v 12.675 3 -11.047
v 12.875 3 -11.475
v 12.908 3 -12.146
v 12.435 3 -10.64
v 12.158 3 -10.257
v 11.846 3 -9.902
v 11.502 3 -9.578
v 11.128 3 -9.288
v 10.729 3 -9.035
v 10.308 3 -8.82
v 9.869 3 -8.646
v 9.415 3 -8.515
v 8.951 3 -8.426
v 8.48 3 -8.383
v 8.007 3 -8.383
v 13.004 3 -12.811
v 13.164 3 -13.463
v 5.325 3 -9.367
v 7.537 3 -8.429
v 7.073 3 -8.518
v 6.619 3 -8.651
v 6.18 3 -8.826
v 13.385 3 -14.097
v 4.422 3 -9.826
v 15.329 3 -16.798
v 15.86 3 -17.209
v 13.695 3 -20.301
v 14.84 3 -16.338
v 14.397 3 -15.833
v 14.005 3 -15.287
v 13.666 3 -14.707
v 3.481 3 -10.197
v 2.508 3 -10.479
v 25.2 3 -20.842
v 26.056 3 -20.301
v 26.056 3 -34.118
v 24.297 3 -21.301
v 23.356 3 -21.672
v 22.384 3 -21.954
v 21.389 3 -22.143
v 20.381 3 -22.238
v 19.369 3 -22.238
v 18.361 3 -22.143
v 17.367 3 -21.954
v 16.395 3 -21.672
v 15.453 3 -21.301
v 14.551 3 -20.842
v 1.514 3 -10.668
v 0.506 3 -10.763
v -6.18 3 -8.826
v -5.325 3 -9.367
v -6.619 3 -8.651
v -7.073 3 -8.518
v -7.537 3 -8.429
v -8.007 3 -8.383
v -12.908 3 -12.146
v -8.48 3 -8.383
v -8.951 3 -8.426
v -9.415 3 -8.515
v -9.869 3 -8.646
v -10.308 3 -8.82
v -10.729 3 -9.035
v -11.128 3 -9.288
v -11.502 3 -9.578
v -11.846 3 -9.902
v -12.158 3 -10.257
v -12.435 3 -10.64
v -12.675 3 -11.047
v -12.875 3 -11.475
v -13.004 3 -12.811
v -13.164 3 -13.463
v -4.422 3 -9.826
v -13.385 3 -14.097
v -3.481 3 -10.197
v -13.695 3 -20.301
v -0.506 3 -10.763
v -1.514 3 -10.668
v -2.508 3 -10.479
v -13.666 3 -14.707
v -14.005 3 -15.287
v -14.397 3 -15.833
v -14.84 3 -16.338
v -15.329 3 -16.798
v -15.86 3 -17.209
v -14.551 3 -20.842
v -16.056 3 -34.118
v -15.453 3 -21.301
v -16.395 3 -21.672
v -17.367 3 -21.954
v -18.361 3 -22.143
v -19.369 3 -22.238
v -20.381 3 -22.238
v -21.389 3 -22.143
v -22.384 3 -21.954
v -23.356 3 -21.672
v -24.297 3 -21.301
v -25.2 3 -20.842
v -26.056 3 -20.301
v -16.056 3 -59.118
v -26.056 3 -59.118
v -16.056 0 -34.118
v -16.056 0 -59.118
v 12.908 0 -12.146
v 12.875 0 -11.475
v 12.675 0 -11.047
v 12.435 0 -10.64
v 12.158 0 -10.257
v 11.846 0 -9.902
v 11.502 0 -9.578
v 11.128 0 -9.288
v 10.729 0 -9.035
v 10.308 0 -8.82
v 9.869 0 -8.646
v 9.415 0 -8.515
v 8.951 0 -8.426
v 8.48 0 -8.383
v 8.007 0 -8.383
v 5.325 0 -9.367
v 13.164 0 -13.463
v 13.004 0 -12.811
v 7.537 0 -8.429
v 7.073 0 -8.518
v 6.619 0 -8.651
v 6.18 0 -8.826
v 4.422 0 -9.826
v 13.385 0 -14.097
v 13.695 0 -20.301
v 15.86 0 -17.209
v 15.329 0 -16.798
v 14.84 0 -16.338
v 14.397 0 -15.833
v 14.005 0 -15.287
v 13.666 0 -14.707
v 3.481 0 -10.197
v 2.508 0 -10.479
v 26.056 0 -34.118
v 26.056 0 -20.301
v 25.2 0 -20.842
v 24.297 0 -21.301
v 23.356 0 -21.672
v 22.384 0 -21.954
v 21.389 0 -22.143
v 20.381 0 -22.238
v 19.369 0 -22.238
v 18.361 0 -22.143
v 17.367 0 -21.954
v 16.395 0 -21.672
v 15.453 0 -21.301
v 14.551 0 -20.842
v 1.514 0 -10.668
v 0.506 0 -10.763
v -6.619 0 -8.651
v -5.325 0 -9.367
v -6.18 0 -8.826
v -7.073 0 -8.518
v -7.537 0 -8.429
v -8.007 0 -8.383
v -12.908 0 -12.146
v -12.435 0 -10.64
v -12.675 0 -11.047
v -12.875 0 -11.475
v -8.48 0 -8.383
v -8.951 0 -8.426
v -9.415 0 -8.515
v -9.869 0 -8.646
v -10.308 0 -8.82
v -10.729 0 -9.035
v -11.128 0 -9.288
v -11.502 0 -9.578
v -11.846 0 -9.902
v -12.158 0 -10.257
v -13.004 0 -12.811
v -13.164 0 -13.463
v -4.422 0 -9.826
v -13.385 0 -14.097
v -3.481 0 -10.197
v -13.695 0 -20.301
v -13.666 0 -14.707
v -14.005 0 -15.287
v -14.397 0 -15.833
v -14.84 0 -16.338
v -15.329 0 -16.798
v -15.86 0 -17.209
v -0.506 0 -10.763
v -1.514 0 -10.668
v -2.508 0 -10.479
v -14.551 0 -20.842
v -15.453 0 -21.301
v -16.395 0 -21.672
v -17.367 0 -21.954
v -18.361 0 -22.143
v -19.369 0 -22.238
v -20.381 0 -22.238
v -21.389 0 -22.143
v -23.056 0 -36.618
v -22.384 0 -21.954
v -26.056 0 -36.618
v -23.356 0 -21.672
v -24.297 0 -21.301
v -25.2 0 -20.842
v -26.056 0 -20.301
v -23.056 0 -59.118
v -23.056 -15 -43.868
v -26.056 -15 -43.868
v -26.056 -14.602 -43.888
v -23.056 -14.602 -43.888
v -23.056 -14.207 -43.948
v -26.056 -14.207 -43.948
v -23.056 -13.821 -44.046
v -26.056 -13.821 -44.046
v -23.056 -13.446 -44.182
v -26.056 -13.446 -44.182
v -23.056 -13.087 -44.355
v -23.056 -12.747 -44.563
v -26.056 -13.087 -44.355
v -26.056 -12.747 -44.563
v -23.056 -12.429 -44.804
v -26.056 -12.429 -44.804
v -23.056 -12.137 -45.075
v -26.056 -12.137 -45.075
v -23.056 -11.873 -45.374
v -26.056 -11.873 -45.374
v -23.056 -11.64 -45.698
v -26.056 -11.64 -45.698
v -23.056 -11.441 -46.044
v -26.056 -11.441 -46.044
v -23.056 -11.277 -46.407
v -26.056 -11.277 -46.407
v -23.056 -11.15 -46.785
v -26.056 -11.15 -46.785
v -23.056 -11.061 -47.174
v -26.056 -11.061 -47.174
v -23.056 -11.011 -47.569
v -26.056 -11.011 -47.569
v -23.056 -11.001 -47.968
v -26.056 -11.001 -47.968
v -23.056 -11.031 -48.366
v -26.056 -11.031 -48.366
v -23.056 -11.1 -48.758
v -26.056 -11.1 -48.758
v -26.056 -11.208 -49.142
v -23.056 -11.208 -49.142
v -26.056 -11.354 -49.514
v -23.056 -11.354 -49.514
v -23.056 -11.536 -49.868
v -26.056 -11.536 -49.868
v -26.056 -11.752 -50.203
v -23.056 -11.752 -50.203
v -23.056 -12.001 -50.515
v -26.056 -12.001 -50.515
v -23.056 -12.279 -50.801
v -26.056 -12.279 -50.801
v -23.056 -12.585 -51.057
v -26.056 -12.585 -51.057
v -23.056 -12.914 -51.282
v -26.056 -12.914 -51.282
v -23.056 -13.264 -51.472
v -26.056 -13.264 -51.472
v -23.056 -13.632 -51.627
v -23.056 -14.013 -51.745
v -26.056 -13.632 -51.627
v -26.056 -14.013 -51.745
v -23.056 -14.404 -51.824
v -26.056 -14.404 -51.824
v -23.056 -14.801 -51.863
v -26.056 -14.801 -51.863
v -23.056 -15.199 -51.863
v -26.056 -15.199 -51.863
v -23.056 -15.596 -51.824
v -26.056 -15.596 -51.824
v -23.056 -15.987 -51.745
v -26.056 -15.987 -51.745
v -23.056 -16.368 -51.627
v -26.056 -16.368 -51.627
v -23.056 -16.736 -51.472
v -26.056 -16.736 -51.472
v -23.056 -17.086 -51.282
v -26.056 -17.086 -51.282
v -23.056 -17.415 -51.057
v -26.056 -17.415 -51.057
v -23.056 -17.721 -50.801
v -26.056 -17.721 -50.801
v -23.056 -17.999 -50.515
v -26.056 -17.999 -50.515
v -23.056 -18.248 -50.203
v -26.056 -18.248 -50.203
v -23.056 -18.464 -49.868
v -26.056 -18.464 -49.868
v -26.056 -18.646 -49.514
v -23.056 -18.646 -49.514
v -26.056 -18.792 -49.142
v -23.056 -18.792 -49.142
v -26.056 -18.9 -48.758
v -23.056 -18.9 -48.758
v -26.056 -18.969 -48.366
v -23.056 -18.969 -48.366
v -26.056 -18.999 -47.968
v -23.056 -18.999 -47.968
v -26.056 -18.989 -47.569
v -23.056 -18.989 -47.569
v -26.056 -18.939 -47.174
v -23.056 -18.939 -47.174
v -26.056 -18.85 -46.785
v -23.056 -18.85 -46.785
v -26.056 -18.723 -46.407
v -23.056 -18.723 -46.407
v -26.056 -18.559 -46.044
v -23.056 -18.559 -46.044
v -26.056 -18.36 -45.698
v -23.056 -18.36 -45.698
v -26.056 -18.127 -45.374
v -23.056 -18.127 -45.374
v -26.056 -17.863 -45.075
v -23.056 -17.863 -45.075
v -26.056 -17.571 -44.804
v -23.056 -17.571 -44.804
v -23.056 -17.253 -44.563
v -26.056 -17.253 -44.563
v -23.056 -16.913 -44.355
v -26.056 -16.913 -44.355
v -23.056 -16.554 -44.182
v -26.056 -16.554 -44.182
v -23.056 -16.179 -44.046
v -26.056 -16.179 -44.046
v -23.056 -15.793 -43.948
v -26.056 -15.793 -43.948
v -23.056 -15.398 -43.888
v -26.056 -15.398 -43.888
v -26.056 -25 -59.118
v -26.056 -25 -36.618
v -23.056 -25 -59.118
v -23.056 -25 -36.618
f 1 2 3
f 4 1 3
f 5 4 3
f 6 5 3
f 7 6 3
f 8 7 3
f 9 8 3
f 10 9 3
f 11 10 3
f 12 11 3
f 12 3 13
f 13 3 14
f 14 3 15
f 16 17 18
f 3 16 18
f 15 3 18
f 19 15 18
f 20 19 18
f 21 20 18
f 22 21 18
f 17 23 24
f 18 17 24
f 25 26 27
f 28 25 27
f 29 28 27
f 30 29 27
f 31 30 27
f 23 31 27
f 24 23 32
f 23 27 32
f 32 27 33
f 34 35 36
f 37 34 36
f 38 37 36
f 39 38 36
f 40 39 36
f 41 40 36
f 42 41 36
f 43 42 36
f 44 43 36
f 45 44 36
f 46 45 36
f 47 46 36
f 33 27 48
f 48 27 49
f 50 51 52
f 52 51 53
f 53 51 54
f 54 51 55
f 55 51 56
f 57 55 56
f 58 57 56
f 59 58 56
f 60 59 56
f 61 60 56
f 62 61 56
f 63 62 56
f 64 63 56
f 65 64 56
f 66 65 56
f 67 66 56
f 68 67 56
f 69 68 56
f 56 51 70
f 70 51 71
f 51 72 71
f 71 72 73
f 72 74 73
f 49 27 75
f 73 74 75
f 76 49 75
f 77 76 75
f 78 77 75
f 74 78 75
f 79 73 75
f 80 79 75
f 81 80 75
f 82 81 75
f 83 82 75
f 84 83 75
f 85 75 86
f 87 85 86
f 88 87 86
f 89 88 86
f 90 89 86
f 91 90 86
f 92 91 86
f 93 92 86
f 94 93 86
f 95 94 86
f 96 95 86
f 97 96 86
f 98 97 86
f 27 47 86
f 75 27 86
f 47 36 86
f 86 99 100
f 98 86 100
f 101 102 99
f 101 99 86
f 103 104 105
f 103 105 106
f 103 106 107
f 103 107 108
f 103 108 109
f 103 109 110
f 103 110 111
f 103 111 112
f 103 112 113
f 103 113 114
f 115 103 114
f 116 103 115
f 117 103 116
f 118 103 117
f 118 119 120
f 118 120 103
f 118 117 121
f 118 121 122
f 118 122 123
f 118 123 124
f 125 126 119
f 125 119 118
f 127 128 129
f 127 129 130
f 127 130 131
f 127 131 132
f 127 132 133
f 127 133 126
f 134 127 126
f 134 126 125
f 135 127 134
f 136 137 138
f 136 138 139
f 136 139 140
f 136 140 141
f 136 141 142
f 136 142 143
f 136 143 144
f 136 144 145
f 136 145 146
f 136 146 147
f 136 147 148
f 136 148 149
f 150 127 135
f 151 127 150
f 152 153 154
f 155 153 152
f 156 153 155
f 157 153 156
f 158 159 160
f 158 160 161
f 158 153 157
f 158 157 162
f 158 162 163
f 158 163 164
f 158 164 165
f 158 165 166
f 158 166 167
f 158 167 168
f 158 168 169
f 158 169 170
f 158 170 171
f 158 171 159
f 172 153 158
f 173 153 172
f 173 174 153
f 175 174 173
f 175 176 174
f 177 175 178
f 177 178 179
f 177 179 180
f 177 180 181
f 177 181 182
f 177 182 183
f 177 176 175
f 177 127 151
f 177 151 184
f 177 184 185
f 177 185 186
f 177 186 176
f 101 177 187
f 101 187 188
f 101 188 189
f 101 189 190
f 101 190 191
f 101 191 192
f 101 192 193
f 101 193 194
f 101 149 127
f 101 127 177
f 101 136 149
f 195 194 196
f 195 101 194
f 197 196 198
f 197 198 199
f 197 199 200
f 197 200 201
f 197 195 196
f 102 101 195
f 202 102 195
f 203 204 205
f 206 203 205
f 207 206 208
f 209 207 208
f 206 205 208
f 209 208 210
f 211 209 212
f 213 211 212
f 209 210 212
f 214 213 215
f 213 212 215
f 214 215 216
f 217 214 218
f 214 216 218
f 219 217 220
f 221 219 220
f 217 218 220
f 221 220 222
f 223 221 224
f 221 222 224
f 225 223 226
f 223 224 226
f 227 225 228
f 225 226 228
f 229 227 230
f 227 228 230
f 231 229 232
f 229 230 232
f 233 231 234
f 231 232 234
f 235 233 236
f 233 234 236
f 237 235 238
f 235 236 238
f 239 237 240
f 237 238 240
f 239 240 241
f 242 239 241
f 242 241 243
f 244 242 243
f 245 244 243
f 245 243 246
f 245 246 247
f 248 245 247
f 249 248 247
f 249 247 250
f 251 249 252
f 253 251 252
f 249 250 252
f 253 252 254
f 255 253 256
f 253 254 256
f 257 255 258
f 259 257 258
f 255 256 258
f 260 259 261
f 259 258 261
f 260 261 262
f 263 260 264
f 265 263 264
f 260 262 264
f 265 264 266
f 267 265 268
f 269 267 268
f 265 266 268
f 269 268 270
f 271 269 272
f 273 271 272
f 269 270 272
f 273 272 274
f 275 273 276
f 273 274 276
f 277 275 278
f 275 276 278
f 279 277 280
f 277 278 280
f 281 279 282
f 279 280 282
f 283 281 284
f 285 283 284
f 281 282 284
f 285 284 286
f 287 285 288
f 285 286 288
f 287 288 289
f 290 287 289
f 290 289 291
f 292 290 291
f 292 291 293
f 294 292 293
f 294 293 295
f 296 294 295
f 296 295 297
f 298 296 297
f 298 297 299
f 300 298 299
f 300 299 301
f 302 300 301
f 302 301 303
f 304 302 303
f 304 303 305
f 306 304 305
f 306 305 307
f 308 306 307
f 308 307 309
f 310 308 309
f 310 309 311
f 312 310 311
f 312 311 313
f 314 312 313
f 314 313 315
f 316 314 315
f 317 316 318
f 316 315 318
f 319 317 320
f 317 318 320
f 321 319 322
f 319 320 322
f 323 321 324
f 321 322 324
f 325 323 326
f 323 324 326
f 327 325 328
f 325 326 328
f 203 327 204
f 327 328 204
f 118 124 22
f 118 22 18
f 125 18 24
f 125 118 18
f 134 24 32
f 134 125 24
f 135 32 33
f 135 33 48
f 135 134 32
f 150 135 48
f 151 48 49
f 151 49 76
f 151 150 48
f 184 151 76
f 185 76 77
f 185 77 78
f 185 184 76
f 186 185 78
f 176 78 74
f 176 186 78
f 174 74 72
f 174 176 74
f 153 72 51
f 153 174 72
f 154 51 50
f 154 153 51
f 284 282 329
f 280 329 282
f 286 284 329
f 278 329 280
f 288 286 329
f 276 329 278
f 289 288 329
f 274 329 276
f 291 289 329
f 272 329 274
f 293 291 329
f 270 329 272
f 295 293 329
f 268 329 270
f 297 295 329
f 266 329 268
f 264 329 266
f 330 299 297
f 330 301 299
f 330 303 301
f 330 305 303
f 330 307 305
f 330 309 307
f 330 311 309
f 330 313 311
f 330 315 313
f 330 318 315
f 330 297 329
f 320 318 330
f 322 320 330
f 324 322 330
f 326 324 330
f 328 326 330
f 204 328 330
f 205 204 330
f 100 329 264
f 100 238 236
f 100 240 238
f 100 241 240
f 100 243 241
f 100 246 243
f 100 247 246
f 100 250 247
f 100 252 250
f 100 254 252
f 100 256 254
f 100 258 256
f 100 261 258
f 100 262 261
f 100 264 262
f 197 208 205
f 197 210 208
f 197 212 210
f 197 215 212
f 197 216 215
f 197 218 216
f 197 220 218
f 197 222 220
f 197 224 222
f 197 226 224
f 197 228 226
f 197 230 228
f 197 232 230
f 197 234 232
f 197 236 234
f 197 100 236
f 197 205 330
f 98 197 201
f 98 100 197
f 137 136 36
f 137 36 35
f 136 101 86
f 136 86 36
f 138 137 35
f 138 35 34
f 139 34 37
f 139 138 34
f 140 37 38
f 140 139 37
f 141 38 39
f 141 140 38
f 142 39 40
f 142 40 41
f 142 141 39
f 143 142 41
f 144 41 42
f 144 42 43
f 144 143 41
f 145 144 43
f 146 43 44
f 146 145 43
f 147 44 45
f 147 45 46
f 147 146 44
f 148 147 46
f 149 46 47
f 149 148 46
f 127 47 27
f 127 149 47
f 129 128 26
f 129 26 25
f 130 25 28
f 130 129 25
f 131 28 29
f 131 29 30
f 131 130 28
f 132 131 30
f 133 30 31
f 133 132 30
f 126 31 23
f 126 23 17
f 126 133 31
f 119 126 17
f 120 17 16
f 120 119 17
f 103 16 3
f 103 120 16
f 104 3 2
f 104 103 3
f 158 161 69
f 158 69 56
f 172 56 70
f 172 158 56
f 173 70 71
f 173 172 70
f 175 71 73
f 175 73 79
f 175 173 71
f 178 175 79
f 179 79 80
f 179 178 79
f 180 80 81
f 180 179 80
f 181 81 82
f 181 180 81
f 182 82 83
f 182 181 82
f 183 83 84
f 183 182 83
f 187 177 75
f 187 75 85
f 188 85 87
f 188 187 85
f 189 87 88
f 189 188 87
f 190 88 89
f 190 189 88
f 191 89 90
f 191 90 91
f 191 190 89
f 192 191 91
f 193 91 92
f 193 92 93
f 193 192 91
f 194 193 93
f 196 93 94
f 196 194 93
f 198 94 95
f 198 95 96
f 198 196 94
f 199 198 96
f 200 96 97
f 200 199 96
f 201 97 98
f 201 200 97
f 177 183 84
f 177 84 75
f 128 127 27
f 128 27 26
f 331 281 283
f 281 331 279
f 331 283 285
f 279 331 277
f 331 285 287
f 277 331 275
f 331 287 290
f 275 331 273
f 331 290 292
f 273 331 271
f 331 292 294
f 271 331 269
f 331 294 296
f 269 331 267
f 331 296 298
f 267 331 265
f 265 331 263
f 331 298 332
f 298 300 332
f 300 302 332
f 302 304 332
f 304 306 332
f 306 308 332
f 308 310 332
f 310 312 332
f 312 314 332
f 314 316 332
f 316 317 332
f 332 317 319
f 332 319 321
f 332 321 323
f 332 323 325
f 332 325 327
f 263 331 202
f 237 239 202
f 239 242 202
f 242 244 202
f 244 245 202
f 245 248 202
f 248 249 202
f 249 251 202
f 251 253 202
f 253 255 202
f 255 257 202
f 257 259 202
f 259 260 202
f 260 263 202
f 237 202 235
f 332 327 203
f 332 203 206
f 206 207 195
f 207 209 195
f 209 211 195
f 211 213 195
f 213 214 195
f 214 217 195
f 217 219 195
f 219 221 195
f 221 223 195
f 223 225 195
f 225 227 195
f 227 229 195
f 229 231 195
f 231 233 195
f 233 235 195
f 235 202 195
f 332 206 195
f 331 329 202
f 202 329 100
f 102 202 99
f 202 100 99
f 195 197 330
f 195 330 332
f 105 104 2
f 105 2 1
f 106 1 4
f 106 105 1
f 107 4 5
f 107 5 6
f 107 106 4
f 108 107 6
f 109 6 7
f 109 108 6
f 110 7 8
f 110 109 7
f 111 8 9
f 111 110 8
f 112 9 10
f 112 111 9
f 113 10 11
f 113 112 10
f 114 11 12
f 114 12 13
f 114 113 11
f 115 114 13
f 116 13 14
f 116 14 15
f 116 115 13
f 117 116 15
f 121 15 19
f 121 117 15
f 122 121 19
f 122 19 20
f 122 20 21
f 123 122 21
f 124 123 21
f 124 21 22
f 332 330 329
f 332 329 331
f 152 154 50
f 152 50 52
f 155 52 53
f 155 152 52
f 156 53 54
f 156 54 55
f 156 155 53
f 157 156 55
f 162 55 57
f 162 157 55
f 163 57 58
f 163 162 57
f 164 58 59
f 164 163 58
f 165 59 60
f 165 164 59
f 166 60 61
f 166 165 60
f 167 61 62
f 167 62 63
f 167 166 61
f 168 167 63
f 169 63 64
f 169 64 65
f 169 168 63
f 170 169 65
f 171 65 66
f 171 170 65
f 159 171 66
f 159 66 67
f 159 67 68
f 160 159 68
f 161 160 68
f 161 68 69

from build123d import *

# Parameters (mm, degrees)
BOSS_EXTRUDE1_DEPTH = 3
SKETCH3_W           = 3
SKETCH3_H           = 22.5
BOSS_EXTRUDE2_DEPTH = 25
SKETCH4_R           = 4
CUT_EXTRUDE1_DEPTH  = 3


with BuildPart() as part:
    # Sketch2 → Boss-Extrude1 (new body)
    with BuildSketch(Plane(origin=(0, 0, 0), x_dir=(1, 0, 0), z_dir=(0, 1, 0))):
        with BuildLine():
            Line((-15.860247962, 17.20906431), (-13.694996915, 20.301363277))
            ThreePointArc((-13.694996915, 20.301363277), (-19.875283017, 22.25), (-26.055569119, 20.301363277))
            Line((-26.055569119, 20.301363277), (-26.055569119, 34.118363277))
            Line((-26.055569119, 34.118363277), (-26.055569119, 59.118363277))
            Line((-26.055569119, 59.118363277), (-16.055569119, 59.118363277))
            Line((-16.055569119, 59.118363277), (-16.055569119, 34.118363277))
            Line((-16.055569119, 34.118363277), (26.055569119, 34.118363277))
            Line((26.055569119, 34.118363277), (26.055569119, 20.301363277))
            ThreePointArc((26.055569119, 20.301363277), (19.875283017, 22.25), (13.694996915, 20.301363277))
            Line((13.694996915, 20.301363277), (15.860247962, 17.20906431))
            ThreePointArc((15.860247962, 17.20906431), (13.666207185, 14.707240293), (12.875283017, 11.475))
            ThreePointArc((12.875283017, 11.475), (10.090653959, 8.727908609), (6.180286102, 8.826363277))
            ThreePointArc((6.180286102, 8.826363277), (0, 10.775), (-6.180286102, 8.826363277))
            ThreePointArc((-6.180286102, 8.826363277), (-10.090653959, 8.727908609), (-12.875283017, 11.475))
            ThreePointArc((-12.875283017, 11.475), (-13.666207185, 14.707240293), (-15.860247962, 17.20906431))
        make_face()
    extrude(amount=BOSS_EXTRUDE1_DEPTH)

    # Sketch3 → Boss-Extrude2 (add)
    with BuildSketch(Plane.XZ):
        with Locations((-24.555569119, -47.868363277)):
            Rectangle(SKETCH3_W, SKETCH3_H)
    extrude(amount=BOSS_EXTRUDE2_DEPTH)

    # Sketch4 → Cut-Extrude1 (cut)
    with BuildSketch(Plane.ZY.offset(26.055569119)):
        with Locations((-47.868363277, -15)):
            Circle(SKETCH4_R)
    extrude(amount=-CUT_EXTRUDE1_DEPTH, mode=Mode.SUBTRACT)


solid = part.part
